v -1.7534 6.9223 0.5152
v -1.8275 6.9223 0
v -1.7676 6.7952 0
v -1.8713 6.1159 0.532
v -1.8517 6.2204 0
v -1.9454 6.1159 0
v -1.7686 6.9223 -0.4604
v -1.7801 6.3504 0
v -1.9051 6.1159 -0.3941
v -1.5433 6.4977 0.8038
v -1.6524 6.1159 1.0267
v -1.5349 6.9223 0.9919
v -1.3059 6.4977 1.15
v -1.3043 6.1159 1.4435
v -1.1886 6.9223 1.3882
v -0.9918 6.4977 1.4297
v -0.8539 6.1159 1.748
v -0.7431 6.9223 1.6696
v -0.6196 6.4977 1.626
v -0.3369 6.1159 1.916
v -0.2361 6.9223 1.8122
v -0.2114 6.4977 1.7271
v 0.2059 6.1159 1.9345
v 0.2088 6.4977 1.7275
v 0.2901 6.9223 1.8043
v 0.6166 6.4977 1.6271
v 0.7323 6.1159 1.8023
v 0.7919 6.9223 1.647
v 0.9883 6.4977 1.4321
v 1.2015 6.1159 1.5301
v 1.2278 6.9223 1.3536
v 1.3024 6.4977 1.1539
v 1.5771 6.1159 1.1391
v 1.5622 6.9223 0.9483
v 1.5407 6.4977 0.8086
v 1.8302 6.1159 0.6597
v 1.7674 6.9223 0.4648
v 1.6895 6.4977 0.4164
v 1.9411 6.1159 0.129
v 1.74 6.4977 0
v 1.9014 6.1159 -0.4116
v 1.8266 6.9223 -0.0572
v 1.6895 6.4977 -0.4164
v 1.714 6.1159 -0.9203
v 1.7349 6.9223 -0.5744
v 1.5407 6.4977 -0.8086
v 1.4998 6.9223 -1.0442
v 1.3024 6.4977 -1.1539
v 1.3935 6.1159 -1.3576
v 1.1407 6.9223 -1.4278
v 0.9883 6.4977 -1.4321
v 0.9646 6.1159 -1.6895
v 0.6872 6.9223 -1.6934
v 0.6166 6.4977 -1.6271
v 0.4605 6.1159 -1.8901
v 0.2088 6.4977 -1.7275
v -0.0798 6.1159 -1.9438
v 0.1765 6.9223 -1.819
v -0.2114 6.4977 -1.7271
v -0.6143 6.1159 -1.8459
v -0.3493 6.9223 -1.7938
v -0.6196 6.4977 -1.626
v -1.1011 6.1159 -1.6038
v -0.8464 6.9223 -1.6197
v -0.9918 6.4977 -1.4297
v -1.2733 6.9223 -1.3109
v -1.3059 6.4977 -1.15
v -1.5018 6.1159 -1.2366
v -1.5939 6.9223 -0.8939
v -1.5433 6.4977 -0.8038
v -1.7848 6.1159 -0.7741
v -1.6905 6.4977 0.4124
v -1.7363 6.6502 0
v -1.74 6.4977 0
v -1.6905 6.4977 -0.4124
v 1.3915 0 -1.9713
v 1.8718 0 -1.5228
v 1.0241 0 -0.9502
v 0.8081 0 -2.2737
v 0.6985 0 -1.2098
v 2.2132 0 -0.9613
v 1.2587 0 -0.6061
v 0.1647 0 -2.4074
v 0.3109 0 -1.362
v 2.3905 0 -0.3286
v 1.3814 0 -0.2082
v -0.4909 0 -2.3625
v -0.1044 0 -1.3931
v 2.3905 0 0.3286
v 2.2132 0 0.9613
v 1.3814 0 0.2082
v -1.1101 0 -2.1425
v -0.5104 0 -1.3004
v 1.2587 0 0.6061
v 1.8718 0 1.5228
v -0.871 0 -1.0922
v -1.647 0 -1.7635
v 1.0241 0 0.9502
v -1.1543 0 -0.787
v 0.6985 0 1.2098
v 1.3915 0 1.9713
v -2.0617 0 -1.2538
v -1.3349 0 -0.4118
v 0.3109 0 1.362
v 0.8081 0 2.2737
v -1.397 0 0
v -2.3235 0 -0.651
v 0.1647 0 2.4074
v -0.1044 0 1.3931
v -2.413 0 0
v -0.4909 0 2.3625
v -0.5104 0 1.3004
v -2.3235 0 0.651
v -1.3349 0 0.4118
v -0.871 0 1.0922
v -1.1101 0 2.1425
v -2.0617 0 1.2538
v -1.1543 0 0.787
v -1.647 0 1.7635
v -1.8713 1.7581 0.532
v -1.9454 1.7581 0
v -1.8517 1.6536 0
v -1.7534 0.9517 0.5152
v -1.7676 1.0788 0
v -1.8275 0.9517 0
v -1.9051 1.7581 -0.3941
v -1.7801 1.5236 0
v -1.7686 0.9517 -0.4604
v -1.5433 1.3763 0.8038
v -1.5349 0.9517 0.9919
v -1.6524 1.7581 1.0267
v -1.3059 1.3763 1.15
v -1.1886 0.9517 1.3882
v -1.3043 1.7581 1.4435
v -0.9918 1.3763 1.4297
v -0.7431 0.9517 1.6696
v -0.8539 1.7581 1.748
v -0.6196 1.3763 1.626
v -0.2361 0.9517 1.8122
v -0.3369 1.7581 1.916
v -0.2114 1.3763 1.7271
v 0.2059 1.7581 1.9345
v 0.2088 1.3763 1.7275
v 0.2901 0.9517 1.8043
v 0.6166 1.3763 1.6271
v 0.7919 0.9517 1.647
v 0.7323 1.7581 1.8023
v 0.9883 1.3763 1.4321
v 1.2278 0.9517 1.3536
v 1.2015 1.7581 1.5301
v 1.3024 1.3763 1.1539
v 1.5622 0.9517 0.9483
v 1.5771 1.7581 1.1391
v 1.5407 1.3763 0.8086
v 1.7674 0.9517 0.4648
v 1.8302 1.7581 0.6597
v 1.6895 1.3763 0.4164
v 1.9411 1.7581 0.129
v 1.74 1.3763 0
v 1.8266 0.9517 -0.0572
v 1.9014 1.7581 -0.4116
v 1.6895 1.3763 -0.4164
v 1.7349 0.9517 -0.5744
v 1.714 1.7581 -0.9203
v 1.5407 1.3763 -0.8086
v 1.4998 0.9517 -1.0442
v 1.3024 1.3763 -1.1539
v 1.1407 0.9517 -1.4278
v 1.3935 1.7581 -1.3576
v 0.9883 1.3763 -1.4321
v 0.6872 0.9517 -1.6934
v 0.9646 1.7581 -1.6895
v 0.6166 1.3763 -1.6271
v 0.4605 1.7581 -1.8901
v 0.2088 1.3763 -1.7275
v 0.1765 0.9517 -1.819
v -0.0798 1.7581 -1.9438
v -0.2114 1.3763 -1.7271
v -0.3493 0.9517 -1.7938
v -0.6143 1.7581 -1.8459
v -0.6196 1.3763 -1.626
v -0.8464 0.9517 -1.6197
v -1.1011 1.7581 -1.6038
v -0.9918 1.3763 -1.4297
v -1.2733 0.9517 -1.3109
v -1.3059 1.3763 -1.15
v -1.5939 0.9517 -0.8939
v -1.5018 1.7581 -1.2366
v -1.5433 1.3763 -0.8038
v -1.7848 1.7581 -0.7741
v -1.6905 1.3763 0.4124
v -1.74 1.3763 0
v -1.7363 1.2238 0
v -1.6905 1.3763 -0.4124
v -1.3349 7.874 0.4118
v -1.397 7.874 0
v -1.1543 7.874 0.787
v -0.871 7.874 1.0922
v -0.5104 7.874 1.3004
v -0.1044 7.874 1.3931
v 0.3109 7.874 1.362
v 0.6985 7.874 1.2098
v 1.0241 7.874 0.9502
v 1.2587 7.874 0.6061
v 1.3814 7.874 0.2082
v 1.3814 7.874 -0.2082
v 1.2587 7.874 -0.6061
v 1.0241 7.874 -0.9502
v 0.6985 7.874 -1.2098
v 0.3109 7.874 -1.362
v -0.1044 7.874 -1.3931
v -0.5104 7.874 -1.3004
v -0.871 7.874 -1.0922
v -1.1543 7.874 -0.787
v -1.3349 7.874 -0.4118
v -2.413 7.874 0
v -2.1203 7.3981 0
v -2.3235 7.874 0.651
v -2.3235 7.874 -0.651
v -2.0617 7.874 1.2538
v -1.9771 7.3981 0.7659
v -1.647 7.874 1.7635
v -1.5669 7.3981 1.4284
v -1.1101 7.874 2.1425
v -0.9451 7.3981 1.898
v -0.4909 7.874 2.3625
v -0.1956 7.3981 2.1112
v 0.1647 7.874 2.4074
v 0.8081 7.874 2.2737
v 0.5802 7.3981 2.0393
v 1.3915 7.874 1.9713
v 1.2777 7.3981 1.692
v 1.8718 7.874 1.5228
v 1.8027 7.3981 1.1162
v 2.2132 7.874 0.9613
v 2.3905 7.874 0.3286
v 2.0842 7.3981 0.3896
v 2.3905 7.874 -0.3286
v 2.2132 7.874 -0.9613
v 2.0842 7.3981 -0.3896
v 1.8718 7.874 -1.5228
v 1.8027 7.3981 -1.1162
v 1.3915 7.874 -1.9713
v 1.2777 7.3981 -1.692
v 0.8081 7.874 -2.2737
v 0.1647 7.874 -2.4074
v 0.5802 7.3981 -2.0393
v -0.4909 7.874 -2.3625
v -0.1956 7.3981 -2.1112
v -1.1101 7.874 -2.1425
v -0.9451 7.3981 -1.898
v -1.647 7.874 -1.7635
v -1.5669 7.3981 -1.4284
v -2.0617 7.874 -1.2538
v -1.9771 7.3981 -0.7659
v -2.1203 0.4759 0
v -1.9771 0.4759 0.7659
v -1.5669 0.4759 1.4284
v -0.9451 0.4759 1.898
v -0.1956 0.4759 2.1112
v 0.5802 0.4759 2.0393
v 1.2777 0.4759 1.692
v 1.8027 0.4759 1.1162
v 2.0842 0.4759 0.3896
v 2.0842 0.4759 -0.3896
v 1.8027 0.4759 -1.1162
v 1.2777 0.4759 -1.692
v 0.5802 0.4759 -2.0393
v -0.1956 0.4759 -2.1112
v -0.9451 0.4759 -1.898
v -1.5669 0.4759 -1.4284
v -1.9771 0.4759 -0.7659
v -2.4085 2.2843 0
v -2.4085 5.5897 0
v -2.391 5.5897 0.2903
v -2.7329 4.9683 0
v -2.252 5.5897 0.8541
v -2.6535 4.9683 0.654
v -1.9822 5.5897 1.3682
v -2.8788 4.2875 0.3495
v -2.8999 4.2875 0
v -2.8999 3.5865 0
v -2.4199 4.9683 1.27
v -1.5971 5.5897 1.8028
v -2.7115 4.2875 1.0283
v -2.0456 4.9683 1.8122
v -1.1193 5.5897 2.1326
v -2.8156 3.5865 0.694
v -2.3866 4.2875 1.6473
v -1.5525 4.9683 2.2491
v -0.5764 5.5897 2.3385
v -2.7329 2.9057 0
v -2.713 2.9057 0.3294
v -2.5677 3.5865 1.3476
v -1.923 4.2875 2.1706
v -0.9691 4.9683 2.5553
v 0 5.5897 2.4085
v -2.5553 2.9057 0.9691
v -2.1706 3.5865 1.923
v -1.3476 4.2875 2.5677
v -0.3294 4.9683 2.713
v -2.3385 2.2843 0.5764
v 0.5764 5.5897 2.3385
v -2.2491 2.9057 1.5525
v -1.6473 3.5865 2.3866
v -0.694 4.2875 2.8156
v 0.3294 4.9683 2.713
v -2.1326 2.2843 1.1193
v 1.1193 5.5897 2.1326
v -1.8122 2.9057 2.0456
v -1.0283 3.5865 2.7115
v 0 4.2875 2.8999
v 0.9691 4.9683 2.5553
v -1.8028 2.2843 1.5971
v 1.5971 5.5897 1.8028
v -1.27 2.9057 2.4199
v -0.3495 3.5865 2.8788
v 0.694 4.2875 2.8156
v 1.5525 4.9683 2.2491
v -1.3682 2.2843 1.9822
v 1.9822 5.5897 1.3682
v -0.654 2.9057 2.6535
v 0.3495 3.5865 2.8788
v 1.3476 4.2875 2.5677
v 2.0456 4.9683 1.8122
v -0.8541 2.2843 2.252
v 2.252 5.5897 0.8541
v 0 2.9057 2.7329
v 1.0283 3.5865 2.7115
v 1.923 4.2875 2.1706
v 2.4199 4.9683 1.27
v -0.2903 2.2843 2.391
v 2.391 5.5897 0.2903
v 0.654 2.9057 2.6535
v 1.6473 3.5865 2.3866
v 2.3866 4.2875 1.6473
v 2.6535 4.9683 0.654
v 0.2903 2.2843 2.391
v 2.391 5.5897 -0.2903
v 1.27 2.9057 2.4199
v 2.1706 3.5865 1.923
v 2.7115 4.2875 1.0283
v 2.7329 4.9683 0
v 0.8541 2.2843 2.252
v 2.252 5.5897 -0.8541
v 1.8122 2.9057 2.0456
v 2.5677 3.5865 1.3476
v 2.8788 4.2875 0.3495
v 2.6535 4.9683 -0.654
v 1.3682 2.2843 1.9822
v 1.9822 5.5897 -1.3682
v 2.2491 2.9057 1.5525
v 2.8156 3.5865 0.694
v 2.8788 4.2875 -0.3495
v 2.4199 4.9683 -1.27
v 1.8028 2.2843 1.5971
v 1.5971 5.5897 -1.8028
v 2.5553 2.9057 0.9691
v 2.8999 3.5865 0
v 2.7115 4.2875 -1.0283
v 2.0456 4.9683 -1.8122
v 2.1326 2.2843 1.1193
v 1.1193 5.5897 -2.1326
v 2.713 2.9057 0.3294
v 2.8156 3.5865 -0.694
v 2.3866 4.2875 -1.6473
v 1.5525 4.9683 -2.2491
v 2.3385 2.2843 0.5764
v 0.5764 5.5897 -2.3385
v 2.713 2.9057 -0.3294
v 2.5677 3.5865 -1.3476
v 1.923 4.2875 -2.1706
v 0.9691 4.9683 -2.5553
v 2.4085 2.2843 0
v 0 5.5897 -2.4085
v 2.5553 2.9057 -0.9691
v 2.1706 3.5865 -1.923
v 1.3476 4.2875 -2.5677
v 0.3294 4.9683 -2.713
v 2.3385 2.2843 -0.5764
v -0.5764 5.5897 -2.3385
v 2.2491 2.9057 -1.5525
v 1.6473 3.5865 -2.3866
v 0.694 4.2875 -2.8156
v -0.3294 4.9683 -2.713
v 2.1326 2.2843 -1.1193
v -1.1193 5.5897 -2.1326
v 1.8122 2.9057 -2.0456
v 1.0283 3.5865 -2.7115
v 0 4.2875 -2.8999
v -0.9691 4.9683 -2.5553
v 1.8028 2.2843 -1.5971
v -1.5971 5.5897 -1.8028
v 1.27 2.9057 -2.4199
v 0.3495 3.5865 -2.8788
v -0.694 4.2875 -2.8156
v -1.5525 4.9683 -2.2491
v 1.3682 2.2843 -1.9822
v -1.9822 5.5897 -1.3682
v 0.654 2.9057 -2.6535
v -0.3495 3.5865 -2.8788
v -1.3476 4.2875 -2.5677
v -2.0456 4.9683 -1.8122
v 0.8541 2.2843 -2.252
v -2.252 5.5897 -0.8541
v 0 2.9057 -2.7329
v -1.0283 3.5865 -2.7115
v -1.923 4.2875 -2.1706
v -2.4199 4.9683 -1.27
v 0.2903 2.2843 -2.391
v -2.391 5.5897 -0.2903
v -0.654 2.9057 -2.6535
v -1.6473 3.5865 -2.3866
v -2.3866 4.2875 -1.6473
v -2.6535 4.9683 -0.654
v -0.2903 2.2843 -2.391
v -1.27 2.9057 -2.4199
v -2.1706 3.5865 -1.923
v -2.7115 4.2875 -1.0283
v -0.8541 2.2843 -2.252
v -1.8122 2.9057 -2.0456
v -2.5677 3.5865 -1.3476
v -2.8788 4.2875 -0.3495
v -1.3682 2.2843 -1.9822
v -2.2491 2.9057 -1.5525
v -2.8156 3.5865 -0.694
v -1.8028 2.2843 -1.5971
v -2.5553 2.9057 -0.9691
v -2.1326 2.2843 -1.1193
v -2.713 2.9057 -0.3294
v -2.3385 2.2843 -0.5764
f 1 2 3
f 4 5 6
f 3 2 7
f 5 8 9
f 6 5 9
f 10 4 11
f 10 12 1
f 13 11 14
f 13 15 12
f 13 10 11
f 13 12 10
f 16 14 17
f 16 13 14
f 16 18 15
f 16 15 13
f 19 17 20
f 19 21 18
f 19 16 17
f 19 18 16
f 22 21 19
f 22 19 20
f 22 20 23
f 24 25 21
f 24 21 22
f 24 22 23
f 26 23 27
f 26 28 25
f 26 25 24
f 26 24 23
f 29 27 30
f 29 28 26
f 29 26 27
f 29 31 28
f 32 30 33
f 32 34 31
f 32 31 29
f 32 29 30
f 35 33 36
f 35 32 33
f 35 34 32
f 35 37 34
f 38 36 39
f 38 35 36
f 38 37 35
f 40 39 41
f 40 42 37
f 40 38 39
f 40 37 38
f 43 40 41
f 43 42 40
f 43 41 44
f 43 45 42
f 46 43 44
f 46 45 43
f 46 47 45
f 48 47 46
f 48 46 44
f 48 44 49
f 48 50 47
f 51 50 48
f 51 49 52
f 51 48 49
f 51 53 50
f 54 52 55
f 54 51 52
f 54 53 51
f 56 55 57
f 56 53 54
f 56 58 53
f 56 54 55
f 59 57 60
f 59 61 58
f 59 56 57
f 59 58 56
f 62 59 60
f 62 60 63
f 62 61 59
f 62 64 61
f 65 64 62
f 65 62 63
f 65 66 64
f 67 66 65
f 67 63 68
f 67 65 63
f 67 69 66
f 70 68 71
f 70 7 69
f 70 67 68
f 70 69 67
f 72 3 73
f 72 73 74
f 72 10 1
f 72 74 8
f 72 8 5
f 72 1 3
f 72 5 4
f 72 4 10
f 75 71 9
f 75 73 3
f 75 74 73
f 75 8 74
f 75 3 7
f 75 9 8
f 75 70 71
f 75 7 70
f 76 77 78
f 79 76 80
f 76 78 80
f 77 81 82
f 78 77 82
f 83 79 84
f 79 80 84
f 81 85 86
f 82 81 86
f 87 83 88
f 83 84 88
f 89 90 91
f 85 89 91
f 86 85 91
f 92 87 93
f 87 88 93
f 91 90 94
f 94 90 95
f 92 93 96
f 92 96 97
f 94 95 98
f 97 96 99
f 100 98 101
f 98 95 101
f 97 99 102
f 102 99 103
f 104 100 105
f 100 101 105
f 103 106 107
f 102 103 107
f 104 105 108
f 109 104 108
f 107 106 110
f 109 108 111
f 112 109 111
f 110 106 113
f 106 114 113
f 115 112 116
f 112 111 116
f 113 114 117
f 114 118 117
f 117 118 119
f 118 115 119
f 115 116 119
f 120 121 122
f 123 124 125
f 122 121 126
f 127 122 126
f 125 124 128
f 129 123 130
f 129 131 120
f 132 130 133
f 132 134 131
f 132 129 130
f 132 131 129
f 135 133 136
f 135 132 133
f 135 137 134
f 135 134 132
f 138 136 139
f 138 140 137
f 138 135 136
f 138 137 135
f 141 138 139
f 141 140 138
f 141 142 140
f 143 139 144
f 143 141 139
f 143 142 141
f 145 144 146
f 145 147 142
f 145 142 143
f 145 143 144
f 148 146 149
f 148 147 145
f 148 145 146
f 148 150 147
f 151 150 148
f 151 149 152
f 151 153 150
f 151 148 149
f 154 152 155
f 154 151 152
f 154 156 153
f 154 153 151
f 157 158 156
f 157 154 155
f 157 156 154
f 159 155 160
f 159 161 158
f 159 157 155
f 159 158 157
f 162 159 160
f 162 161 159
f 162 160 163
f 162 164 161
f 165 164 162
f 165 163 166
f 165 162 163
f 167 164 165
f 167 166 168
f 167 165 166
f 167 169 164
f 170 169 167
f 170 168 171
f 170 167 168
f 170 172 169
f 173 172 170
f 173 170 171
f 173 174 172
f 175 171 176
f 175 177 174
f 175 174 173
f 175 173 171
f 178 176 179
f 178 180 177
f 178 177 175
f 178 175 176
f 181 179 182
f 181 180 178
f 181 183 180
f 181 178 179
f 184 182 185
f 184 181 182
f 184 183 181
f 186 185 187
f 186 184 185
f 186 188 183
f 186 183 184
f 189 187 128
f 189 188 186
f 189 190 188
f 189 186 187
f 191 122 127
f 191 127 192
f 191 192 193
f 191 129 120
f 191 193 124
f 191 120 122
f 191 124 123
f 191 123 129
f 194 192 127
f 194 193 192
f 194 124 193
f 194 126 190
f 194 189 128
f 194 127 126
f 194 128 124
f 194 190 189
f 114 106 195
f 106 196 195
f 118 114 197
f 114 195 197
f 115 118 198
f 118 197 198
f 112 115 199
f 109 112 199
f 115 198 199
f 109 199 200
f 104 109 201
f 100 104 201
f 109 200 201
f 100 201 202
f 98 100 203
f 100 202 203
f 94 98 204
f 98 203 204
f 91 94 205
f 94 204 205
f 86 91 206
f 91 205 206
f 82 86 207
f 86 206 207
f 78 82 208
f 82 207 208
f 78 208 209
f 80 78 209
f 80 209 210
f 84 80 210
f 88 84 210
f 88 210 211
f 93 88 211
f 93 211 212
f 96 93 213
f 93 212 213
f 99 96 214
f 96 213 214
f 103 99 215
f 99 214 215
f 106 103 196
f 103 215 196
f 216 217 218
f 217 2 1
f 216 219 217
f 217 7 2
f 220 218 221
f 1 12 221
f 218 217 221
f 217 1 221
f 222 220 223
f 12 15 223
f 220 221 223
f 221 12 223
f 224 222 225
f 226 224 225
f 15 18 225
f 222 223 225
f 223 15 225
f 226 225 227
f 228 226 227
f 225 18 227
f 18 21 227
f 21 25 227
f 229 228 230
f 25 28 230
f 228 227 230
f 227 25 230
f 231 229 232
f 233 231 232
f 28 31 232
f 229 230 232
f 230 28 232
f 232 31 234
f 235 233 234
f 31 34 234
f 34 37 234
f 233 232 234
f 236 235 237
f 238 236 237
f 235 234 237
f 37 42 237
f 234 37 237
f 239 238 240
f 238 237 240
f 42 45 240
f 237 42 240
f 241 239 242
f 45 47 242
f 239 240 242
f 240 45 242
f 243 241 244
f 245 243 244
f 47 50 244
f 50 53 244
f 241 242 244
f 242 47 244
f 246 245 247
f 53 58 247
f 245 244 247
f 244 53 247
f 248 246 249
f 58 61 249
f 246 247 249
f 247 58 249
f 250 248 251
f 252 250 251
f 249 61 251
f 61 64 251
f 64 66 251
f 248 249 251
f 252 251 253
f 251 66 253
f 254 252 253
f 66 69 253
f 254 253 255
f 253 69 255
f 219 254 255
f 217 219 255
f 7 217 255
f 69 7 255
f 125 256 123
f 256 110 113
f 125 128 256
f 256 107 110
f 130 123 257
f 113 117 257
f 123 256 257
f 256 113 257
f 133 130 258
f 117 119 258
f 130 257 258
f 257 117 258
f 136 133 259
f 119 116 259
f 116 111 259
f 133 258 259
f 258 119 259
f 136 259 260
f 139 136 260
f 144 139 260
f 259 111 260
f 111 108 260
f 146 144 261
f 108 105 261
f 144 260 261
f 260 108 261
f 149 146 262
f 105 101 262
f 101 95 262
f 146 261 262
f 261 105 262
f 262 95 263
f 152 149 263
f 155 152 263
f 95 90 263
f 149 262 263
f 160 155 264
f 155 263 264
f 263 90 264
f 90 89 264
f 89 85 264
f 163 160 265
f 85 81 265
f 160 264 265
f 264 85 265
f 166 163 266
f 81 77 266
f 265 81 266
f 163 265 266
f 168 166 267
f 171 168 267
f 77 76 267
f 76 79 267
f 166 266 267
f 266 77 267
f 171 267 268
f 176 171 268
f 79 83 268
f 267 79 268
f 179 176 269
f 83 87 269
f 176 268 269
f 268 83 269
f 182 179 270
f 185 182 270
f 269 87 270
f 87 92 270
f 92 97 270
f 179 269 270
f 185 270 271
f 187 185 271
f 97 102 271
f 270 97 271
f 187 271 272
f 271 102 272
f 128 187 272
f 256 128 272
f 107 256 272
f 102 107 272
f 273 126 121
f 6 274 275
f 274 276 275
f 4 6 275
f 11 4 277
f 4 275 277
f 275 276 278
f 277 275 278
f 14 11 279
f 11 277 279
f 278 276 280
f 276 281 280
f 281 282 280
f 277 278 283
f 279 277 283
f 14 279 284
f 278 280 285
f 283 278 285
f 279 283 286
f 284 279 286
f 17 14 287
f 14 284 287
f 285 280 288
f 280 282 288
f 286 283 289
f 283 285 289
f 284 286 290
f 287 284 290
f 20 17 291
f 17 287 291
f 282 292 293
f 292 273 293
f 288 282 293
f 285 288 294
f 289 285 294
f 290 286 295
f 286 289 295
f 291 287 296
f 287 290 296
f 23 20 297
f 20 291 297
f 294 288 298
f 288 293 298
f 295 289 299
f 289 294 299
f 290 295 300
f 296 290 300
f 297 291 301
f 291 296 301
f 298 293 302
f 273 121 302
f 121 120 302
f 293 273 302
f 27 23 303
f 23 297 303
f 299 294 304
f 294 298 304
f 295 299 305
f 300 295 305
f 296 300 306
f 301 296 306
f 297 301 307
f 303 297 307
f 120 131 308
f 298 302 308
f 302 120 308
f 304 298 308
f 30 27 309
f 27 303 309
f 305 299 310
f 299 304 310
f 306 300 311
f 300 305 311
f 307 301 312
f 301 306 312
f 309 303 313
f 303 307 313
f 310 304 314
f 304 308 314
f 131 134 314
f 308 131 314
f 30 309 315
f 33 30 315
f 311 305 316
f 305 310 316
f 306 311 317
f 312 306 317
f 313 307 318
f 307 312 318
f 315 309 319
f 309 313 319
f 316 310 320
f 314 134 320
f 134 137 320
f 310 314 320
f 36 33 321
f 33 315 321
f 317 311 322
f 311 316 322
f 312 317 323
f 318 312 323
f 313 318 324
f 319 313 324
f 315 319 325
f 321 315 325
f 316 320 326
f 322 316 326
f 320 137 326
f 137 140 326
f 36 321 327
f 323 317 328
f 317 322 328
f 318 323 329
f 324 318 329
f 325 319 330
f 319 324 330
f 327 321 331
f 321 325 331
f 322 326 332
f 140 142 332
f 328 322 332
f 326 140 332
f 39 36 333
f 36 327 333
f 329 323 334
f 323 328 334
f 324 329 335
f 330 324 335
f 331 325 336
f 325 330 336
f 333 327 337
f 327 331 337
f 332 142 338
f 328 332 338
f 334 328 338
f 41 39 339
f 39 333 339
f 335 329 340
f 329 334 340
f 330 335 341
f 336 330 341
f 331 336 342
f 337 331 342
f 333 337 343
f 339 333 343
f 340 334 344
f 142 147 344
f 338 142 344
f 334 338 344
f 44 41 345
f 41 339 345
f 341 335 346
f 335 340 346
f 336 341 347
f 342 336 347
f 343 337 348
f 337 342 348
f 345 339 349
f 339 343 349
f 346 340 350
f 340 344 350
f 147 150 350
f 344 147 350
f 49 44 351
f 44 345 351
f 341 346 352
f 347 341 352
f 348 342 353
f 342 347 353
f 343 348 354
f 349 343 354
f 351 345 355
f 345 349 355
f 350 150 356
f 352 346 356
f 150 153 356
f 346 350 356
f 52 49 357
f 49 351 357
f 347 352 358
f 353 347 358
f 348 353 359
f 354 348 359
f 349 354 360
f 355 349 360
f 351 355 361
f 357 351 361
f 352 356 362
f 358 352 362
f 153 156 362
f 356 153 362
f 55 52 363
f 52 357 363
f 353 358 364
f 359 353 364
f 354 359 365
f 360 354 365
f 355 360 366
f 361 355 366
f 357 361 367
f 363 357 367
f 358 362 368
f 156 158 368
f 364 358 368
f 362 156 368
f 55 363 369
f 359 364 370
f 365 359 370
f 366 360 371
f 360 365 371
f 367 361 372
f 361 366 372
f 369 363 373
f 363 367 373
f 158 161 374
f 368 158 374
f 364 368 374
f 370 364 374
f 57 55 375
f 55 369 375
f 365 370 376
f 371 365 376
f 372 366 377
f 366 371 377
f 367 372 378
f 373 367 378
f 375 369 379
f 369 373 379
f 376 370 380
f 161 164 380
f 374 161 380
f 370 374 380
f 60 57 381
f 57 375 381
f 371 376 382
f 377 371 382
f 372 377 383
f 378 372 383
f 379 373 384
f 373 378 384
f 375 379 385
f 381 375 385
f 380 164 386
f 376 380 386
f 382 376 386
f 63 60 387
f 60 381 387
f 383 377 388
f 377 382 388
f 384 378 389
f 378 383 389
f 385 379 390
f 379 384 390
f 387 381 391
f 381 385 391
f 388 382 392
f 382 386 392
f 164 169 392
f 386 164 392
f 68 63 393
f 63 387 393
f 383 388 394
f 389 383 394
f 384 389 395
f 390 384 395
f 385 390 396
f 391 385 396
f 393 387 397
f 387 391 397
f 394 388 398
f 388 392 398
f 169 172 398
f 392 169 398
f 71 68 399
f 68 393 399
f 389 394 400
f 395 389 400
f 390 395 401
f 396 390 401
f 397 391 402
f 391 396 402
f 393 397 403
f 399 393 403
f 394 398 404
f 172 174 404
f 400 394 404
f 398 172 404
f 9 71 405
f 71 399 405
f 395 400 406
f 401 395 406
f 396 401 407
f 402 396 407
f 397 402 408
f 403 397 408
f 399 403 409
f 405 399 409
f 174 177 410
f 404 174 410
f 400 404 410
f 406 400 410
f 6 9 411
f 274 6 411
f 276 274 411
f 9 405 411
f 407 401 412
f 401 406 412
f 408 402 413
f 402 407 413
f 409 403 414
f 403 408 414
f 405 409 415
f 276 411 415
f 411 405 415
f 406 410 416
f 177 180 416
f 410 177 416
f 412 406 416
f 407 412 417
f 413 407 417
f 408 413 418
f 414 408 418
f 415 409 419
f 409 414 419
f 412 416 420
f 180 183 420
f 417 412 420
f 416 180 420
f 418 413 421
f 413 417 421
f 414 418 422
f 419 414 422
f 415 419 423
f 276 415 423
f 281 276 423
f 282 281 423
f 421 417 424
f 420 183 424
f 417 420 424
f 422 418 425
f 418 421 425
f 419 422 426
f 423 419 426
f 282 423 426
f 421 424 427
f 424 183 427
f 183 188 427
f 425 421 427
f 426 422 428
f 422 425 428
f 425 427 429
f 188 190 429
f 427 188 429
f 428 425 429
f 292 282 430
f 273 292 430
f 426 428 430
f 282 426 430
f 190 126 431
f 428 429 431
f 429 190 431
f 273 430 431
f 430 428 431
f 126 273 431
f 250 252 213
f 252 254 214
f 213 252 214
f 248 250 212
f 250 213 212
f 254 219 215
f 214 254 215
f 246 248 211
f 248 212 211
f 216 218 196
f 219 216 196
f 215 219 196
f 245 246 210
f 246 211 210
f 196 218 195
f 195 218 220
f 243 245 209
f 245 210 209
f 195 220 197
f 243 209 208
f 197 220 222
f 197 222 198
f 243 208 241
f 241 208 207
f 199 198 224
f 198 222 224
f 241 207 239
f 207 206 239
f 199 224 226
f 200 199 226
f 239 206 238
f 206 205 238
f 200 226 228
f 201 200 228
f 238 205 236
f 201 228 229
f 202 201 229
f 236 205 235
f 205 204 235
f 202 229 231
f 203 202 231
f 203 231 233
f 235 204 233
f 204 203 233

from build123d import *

# Parameters (mm, degrees)
FILLET1_R = 0.635


with BuildPart() as part:
    # Sketch1 → Revolve1 (revolve)
    with BuildSketch(Plane.XY):
        with BuildLine():
            Line((-1.397, 7.874), (-2.413, 7.874))
            Line((-2.413, 7.874), (-1.524, 6.428919943))
            ThreePointArc((-1.524, 6.428919943), (-2.921, 3.937), (-1.524, 1.445080057))
            Line((-1.524, 1.445080057), (-2.413, 0))
            Line((-2.413, 0), (-1.397, 0))
            Line((-1.397, 0), (-1.397, 7.874))
        make_face()
    revolve(axis=Axis((0, 0, 0), (0, 1, 0)))

    # Fillet1
    fillet1_edges = [part.edges().sort_by_distance(p)[0] for p in [
        (1.524, 1.445080057, 0),
        (1.524, 6.428919943, 0),
    ]]
    fillet(fillet1_edges, radius=FILLET1_R)


solid = part.part
